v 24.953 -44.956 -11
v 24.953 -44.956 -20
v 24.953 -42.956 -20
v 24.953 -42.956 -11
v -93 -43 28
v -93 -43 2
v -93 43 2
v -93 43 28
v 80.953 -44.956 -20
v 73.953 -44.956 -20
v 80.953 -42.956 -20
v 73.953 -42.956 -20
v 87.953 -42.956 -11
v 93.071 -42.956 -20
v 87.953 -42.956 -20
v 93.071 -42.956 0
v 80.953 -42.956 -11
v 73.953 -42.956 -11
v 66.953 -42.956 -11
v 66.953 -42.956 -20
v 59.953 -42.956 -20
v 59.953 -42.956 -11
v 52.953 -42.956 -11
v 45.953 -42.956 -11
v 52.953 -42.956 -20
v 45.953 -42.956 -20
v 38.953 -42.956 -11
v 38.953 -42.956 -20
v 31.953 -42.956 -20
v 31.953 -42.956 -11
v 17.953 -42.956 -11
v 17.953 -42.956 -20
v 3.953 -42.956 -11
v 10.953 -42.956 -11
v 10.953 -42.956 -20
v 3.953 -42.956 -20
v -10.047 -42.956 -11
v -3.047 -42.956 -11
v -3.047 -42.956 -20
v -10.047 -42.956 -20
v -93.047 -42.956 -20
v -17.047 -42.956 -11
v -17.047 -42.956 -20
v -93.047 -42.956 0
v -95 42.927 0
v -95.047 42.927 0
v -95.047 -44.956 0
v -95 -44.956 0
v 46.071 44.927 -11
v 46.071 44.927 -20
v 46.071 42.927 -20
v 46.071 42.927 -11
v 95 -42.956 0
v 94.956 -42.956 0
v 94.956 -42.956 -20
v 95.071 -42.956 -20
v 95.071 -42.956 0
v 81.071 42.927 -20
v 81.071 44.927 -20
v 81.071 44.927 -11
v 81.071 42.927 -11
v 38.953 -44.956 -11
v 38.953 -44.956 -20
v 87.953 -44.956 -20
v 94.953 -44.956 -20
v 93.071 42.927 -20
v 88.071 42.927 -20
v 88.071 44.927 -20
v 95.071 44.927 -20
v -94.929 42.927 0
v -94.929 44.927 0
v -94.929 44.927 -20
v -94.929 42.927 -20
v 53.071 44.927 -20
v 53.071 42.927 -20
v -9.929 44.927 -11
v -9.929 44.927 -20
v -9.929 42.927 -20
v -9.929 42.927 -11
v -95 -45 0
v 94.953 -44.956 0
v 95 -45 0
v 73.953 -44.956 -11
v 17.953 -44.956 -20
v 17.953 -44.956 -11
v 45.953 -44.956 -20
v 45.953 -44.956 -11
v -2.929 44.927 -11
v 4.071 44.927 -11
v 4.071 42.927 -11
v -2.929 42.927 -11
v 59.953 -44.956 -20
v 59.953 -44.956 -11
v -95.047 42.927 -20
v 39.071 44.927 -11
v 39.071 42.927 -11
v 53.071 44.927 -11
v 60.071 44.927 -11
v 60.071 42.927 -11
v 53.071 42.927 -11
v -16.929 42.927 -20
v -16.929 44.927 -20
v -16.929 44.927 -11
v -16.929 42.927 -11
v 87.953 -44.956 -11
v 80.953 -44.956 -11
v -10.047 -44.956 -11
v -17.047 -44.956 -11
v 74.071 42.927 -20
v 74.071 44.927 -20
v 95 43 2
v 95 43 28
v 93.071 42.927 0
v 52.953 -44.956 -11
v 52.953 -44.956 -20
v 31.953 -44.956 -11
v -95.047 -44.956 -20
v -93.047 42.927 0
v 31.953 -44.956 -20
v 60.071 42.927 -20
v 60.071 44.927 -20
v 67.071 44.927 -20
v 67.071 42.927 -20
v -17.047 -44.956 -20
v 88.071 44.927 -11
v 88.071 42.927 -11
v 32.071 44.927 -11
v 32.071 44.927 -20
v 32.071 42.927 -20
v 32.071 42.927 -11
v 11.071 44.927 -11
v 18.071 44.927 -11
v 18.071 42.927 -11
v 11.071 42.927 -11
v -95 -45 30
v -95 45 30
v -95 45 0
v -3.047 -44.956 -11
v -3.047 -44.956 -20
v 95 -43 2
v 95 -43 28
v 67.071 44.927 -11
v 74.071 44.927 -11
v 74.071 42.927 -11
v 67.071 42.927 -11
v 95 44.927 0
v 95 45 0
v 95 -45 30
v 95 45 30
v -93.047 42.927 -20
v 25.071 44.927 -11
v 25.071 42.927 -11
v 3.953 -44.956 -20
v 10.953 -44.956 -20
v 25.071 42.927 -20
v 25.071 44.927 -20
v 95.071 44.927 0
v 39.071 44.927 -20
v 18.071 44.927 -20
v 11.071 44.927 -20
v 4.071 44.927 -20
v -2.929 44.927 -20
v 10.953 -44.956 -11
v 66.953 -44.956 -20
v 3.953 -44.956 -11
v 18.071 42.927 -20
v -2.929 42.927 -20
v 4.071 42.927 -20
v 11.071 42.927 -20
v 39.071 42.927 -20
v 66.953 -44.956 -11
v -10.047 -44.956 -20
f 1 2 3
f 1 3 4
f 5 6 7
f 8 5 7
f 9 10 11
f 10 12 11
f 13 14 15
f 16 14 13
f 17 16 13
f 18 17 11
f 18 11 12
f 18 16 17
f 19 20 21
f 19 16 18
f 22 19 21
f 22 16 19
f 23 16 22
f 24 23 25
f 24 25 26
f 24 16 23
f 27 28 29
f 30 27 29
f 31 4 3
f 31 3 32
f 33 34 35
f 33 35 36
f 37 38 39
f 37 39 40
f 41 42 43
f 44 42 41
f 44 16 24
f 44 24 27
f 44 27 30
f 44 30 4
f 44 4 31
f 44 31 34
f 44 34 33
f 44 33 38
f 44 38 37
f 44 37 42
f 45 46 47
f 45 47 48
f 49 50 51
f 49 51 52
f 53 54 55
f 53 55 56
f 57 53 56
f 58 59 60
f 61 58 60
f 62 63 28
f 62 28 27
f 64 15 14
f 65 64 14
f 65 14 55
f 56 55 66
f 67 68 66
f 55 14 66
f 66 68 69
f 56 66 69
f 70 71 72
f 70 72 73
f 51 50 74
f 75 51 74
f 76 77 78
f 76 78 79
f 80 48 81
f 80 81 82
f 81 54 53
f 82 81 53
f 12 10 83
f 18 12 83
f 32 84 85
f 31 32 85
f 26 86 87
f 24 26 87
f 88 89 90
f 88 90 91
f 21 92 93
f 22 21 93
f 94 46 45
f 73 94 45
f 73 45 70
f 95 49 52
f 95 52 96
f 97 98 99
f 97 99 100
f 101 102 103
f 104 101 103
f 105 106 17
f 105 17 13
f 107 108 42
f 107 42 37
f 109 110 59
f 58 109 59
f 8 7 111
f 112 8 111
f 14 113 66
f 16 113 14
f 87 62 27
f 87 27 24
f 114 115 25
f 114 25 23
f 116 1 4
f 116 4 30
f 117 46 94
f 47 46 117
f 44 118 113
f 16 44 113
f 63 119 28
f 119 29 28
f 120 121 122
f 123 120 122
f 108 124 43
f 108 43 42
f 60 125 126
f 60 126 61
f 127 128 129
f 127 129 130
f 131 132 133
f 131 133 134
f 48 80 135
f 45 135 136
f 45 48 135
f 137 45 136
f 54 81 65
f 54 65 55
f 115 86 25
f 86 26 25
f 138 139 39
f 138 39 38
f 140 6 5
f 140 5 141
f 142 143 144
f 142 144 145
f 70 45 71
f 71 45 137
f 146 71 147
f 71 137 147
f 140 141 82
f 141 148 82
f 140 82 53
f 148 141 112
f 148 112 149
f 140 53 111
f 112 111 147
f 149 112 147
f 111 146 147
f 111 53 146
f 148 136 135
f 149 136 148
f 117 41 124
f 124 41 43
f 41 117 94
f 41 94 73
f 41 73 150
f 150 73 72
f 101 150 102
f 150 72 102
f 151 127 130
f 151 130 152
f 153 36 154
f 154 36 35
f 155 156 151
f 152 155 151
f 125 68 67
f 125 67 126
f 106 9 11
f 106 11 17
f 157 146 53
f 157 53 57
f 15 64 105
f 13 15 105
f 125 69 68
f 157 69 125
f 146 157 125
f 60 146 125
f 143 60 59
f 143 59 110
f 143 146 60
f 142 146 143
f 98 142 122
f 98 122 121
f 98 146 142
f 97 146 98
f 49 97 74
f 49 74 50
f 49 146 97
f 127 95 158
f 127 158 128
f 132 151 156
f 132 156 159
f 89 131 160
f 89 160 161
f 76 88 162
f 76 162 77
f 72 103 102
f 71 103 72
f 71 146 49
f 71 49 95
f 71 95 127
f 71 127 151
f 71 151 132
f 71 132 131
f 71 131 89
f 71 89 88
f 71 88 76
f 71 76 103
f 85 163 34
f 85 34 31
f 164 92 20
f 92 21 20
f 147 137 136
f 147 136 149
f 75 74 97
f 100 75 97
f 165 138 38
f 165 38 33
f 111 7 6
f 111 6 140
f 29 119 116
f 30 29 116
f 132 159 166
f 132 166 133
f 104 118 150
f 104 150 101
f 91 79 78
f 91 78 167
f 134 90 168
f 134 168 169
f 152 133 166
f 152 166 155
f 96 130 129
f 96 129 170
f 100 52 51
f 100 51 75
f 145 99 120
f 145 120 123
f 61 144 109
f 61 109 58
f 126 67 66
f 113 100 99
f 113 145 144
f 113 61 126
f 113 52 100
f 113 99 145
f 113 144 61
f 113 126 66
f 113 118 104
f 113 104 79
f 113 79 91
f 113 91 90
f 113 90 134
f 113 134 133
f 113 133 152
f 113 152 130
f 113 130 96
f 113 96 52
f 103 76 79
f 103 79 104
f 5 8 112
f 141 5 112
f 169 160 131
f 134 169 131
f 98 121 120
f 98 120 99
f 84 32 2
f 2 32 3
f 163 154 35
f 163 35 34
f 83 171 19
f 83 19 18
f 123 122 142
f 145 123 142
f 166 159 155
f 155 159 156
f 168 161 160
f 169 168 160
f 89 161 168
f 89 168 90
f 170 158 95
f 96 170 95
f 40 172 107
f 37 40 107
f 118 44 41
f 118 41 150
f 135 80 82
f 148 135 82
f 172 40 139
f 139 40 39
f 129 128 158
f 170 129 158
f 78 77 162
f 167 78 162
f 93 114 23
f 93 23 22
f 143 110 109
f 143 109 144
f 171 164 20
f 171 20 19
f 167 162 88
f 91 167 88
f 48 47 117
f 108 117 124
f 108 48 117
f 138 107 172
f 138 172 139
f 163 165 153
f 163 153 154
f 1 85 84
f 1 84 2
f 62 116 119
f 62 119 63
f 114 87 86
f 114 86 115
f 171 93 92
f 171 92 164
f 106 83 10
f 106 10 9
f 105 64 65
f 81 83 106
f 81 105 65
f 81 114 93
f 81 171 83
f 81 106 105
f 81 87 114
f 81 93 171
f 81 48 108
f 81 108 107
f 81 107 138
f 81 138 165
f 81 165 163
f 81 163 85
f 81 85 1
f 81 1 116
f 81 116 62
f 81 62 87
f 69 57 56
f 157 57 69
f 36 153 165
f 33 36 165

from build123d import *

# Parameters (mm, degrees)
F0_W     = 190
F0_H     = 90
F1_DEPTH = 30
F2_T     = -2
F4_DEPTH = 20
F3_W     = 0.1180022955
F3_H     = 85.8825759888
F3_W_2   = 1.8819977045
F5_DEPTH = 20
F6_W     = 7
F6_H     = 9
F7_DEPTH = 4
F8_W     = 7
F8_H     = 9
F9_DEPTH = 4


with BuildPart() as f1:
    # F0 (on Top) → F1 (new body)
    with BuildSketch(Plane.XY):
        Rectangle(F0_W, F0_H)
    extrude(amount=F1_DEPTH)

    # F2
    f2_openings = [f1.faces().sort_by_distance(p)[0] for p in [
        (95, 0, 15),
    ]]
    offset(amount=F2_T, openings=f2_openings)

    # F3 (on Top) → F4 (join)
    with BuildSketch(Plane.XY):
        Polygon((95.0710946321, 42.9269237816), (95.0710946321, 44.9269237816), (-94.9289053679, 44.9269237816), (-94.9289053679, 42.9269237816), (-93.0469076633, 42.9269237816), (93.0710946321, 42.9269237816), align=None)
    extrude(amount=-F4_DEPTH)

    # F3 (on Top) → F5 (join)
    with BuildSketch(Plane.XY):
        Polygon((95.0710946321, 42.9269237816), (95.0710946321, 44.9269237816), (-94.9289053679, 44.9269237816), (-94.9289053679, 42.9269237816), (-93.0469076633, 42.9269237816), (93.0710946321, 42.9269237816), align=None)
        Polygon((95.0710946321, -42.9556522071), (95.0710946321, 42.9269237816), (93.0710946321, 42.9269237816), (93.0710946321, -42.9556522071), (94.9564541443, -42.9556522071), align=None)
        with Locations((-94.9879065156, -0.0143642128)):
            Rectangle(F3_W, F3_H)
        with Locations((-93.9879065156, -0.0143642128)):
            Rectangle(F3_W_2, F3_H)
        Polygon((-93.0469076633, -42.9556522071), (-94.9289053679, -42.9556522071), (-95.0469076633, -42.9556522071), (-95.0469076633, -44.9556522071), (94.9533249005, -44.9556522071), (94.9564541443, -42.9556522071), (93.0710946321, -42.9556522071), align=None)
    extrude(amount=-F5_DEPTH)

    # F6 (on face) → F7 (cut)
    with BuildSketch(Plane(origin=(0, 44.9269237816, 0), x_dir=(-1, 0, 0), z_dir=(0, 1, 0))):
        with Locations((13.4289053679, -15.5)):
            Rectangle(F6_W, F6_H)
        with Locations((-0.5710946321, -15.5)):
            Rectangle(F6_W, F6_H)
        with Locations((-14.5710946321, -15.5)):
            Rectangle(F6_W, F6_H)
        with Locations((-28.5710946321, -15.5)):
            Rectangle(F6_W, F6_H)
        with Locations((-42.5710946321, -15.5)):
            Rectangle(F6_W, F6_H)
        with Locations((-56.5710946321, -15.5)):
            Rectangle(F6_W, F6_H)
        with Locations((-70.5710946321, -15.5)):
            Rectangle(F6_W, F6_H)
        with Locations((-84.5710946321, -15.5)):
            Rectangle(F6_W, F6_H)
    extrude(amount=-F7_DEPTH, mode=Mode.SUBTRACT)

    # F8 (on face) → F9 (cut)
    with BuildSketch(Plane.XZ.offset(44.9556522071)):
        with Locations((84.4533249005, -15.5)):
            Rectangle(F8_W, F8_H)
        with Locations((70.4533249005, -15.5)):
            Rectangle(F8_W, F8_H)
        with Locations((56.4533249005, -15.5)):
            Rectangle(F8_W, F8_H)
        with Locations((42.4533249005, -15.5)):
            Rectangle(F8_W, F8_H)
        with Locations((28.4533249005, -15.5)):
            Rectangle(F8_W, F8_H)
        with Locations((14.4533249005, -15.5)):
            Rectangle(F8_W, F8_H)
        with Locations((0.4533249005, -15.5)):
            Rectangle(F8_W, F8_H)
        with Locations((-13.5466750995, -15.5)):
            Rectangle(F8_W, F8_H)
    extrude(amount=-F9_DEPTH, mode=Mode.SUBTRACT)


solid = f1.part
